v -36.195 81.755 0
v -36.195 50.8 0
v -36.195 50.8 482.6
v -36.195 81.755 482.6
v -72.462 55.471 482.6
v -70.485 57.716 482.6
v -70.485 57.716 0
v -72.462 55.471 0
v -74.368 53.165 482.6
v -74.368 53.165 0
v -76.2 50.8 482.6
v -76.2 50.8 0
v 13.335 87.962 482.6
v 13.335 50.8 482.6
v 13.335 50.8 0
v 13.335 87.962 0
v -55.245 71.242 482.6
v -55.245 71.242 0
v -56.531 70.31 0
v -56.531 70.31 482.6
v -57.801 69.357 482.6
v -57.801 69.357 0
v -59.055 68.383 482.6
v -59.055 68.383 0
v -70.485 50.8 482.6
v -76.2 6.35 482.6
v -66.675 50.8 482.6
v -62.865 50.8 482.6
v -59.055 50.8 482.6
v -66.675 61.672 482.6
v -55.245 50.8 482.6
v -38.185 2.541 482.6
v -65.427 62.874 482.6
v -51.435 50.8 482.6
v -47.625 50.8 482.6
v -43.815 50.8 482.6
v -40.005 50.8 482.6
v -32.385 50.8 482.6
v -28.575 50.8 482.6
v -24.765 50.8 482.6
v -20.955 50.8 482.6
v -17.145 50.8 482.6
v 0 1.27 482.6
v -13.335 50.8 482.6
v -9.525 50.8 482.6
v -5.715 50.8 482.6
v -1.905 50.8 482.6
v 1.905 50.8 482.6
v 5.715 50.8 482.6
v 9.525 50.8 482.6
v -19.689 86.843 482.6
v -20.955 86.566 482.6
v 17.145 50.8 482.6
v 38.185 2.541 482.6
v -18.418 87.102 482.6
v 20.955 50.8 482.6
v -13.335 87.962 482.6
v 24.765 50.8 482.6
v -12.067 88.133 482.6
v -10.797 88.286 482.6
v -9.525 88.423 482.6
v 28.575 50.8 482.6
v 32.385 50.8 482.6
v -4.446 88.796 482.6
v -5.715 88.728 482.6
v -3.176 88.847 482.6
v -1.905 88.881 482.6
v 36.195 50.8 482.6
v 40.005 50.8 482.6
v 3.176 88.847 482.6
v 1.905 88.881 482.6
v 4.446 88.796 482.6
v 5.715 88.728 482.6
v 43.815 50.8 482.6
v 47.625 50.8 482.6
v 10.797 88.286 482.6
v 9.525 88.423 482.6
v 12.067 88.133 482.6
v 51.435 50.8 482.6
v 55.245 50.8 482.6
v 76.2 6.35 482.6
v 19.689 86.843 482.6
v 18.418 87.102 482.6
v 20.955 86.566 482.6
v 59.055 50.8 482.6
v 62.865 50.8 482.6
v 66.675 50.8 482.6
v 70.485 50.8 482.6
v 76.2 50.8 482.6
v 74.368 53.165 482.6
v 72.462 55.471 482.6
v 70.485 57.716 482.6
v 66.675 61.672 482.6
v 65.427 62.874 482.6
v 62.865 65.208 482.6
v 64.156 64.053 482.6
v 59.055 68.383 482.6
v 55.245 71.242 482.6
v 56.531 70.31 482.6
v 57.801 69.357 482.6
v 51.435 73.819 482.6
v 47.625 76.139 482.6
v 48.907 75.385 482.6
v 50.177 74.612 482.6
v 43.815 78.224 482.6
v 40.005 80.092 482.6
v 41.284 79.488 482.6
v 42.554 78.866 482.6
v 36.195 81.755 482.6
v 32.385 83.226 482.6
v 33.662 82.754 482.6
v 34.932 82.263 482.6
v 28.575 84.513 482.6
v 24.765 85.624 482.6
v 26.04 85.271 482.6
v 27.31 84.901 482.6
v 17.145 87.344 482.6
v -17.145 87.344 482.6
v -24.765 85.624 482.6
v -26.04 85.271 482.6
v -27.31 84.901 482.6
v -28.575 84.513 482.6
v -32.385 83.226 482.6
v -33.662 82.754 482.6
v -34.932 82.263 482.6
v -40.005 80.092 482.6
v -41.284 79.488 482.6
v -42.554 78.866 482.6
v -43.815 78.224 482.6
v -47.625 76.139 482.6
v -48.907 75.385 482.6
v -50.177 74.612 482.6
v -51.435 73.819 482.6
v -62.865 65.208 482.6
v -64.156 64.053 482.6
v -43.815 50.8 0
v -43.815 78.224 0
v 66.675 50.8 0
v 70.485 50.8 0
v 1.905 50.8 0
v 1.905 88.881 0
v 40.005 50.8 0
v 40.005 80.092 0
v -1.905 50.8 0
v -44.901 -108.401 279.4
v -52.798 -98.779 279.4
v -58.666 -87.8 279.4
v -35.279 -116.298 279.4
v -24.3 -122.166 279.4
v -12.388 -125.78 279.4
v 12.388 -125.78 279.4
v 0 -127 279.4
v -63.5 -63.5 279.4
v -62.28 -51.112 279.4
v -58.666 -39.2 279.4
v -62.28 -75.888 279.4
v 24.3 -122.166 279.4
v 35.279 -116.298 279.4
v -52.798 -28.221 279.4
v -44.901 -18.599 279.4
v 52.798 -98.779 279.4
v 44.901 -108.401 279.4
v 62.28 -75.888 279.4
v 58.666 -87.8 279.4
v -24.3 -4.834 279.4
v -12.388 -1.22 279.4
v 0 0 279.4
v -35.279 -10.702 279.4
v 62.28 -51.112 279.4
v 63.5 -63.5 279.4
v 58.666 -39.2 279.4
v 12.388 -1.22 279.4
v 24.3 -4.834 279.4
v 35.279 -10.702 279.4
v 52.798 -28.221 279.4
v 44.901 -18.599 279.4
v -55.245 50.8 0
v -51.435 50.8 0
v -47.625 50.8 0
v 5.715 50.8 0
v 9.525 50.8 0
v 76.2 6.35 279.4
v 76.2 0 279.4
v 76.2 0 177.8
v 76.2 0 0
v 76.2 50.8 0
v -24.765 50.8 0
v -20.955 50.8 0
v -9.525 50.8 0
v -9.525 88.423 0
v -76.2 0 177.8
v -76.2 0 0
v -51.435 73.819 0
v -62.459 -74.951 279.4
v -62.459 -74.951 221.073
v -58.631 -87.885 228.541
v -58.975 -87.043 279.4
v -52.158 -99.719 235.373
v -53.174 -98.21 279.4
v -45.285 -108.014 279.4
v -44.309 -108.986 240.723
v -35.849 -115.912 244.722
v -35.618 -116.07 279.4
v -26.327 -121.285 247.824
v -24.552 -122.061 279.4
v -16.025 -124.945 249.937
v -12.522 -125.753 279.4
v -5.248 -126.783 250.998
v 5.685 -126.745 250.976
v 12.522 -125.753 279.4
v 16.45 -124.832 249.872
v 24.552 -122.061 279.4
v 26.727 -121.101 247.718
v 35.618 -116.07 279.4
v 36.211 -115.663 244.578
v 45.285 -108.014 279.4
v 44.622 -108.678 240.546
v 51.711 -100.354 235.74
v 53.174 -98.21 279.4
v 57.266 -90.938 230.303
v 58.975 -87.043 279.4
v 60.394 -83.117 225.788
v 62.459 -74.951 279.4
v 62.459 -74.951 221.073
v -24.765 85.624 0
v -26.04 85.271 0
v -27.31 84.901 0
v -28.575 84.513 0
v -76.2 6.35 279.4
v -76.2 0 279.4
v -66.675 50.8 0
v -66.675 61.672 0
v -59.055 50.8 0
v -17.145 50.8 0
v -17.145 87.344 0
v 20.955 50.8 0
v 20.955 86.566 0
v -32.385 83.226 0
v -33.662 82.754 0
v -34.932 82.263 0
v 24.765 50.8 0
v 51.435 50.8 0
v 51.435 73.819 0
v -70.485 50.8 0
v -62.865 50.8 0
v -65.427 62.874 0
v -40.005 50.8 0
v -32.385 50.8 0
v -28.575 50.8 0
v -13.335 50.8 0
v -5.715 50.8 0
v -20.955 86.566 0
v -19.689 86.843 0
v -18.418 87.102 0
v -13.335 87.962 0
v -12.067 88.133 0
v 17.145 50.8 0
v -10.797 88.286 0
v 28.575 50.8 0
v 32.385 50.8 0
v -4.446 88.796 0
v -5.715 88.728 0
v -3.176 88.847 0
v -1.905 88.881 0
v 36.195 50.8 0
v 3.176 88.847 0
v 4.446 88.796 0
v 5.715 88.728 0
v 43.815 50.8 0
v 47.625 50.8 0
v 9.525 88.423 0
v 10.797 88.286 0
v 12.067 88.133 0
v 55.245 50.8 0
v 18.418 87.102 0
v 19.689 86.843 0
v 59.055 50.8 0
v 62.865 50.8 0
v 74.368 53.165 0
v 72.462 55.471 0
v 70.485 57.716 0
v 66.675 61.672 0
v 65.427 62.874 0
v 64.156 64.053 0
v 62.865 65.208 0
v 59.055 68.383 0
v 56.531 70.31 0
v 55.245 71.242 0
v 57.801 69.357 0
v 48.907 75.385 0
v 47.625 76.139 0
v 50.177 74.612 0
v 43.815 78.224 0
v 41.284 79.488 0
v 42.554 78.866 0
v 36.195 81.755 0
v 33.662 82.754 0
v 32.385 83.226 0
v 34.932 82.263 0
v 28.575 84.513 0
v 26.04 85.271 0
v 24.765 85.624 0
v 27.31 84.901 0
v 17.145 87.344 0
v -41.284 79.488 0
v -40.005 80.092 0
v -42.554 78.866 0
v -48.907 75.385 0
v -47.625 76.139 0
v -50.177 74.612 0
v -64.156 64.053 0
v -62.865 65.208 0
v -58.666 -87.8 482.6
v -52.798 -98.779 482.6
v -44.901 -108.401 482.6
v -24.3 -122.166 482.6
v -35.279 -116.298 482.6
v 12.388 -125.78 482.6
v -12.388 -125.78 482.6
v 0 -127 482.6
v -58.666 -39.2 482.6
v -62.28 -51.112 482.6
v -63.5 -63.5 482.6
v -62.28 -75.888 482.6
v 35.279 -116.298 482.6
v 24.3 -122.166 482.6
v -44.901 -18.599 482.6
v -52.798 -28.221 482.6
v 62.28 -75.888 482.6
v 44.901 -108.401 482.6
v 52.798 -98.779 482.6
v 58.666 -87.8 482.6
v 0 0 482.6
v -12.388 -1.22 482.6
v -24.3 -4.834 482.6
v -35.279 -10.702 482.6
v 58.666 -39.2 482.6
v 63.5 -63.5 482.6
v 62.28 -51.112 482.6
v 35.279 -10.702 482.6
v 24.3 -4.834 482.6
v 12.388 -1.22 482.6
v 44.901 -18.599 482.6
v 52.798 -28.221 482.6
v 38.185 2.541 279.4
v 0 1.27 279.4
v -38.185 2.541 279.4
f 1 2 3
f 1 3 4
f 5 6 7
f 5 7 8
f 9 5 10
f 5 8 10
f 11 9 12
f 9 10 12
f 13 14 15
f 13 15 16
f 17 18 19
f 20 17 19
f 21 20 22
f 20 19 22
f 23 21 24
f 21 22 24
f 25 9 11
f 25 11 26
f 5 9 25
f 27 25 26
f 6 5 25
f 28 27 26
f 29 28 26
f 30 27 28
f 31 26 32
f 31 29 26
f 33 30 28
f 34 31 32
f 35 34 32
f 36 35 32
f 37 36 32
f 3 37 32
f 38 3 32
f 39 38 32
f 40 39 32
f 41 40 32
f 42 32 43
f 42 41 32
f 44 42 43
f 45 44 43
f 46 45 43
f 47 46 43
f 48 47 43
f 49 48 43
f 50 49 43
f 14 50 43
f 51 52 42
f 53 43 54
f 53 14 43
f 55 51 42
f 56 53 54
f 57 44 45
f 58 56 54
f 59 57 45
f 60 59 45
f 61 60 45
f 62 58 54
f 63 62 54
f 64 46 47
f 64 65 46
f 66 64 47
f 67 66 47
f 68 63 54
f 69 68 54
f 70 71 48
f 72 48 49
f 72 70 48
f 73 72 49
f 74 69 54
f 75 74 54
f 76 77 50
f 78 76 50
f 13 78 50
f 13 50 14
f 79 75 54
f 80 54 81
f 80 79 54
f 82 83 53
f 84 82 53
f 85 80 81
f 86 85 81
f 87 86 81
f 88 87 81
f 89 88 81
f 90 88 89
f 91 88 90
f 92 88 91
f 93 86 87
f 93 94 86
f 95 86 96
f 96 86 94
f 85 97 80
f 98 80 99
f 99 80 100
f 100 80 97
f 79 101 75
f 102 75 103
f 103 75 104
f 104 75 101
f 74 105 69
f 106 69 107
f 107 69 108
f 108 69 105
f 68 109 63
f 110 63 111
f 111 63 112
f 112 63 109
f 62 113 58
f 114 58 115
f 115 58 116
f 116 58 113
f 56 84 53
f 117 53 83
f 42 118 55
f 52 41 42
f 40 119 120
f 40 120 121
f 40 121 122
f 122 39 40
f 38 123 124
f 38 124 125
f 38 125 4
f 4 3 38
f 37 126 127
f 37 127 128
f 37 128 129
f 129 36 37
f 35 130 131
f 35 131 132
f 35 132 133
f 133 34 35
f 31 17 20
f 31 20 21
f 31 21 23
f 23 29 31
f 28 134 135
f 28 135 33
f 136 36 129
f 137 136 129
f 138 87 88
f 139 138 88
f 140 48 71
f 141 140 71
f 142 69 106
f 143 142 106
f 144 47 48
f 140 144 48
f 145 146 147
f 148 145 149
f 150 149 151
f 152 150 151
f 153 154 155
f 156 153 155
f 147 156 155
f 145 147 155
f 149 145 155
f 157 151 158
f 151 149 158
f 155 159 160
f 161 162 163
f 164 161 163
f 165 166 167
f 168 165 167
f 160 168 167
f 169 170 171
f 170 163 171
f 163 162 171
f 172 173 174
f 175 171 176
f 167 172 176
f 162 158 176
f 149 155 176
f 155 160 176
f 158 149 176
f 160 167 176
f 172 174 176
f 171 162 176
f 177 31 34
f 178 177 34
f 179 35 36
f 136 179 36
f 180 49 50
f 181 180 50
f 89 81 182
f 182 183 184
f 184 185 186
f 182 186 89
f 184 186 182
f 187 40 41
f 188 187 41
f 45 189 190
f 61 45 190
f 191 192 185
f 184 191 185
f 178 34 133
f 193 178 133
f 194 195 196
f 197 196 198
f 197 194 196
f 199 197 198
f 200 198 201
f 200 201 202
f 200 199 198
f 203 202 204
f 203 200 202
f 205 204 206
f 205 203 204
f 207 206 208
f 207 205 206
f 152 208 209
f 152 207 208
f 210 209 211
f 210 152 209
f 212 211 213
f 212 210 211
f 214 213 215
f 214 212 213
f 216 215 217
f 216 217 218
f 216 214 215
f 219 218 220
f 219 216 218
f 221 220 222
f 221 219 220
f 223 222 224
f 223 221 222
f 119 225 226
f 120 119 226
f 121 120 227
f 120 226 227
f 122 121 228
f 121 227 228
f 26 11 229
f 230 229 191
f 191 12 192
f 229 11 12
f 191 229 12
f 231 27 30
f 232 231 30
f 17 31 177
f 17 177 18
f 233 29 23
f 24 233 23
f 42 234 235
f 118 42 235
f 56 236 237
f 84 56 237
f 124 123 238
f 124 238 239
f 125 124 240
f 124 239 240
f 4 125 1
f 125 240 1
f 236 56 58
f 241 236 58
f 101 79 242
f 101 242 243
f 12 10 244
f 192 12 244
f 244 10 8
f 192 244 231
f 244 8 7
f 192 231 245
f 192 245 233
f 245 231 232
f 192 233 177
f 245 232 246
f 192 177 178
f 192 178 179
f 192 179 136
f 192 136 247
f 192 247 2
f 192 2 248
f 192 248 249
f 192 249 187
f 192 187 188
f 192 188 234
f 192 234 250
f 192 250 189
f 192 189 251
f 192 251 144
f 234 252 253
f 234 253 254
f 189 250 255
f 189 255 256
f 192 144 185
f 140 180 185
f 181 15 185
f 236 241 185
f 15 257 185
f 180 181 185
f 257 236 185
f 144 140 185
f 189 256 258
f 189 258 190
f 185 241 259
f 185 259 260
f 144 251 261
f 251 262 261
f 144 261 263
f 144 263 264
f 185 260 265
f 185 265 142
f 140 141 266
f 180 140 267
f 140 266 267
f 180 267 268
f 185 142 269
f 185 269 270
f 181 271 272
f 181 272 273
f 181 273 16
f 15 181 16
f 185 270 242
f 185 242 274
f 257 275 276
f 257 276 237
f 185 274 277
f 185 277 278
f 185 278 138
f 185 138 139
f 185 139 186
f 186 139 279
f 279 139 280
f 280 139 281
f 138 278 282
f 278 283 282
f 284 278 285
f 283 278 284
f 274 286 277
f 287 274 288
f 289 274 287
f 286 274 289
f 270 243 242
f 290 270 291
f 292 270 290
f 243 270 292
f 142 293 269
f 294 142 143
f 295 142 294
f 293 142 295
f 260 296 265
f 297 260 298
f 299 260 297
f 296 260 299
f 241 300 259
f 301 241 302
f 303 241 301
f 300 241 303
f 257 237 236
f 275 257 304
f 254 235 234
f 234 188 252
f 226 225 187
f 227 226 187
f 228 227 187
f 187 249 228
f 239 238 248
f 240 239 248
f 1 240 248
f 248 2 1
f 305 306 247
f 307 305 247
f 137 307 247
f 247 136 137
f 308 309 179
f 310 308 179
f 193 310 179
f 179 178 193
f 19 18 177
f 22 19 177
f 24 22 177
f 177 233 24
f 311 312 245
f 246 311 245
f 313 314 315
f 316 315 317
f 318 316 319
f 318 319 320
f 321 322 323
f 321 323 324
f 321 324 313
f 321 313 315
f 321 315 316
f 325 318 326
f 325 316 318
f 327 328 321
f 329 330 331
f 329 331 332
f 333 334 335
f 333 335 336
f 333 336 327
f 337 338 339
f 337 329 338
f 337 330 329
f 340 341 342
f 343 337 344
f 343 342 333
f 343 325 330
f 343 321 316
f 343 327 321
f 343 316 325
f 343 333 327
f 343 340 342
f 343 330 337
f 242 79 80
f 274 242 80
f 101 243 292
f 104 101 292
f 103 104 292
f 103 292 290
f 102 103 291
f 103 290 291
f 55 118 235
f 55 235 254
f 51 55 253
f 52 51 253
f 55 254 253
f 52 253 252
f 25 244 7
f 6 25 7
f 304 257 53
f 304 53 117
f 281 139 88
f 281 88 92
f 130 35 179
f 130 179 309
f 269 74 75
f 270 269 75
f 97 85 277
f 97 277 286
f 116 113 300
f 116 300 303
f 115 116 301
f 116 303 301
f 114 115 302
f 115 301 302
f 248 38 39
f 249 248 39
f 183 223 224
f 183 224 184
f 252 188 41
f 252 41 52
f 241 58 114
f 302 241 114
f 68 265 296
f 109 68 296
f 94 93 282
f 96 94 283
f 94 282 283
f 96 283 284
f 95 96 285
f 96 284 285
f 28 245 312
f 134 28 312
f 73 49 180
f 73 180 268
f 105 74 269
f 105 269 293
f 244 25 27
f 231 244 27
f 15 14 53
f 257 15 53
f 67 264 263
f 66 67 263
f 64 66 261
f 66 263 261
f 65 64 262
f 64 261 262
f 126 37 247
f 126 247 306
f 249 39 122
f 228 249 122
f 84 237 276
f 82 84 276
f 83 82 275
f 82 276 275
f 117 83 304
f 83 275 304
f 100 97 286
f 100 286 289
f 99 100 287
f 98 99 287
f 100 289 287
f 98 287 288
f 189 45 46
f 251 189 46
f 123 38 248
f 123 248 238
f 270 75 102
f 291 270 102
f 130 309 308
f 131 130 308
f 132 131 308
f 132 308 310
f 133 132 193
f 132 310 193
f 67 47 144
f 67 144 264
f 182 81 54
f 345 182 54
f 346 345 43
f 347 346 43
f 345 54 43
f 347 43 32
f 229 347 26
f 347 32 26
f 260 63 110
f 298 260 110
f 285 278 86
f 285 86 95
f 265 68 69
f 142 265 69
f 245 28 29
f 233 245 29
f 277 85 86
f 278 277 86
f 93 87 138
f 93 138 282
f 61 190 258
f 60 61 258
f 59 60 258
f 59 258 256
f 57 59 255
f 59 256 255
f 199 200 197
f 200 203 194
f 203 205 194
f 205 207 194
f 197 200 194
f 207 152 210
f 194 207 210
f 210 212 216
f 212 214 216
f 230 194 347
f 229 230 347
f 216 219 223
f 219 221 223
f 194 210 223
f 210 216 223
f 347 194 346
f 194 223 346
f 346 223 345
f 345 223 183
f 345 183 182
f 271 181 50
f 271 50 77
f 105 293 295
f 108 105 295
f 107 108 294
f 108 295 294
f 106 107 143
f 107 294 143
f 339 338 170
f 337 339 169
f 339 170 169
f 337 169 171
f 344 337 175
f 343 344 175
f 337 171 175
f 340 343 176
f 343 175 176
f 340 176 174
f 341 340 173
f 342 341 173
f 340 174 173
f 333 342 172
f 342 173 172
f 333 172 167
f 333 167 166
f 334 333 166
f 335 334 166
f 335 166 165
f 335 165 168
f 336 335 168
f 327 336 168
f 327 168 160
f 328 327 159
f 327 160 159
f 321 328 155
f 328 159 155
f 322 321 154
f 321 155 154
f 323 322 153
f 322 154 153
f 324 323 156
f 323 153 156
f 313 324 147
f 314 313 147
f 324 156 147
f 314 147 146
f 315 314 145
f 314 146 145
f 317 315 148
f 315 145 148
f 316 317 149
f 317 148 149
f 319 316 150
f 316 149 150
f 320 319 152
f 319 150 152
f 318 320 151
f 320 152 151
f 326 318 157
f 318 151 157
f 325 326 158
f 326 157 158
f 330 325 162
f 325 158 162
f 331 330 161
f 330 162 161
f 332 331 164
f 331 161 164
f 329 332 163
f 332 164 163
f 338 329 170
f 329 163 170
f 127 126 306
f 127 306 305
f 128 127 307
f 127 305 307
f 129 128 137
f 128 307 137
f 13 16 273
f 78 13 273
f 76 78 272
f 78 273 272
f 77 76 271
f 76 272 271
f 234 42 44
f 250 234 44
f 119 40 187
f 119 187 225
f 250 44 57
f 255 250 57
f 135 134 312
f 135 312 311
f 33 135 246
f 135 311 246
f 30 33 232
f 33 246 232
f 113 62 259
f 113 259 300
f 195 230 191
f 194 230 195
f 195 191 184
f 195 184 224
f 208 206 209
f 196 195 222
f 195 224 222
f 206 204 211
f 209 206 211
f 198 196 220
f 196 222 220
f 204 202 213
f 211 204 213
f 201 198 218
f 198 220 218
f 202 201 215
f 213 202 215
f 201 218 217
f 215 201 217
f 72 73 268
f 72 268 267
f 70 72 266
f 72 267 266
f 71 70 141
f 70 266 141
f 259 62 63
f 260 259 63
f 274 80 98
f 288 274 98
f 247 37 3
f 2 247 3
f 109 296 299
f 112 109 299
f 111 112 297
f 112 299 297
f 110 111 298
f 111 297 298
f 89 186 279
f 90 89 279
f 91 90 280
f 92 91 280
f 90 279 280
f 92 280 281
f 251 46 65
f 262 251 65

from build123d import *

# Parameters (mm, degrees)
F1_DEPTH  = 482.6
F2_W      = 3.81
F2_H      = 38.1
F3_DEPTH  = 482.6
F5_DEPTH  = 304.8
F6_W      = 138.08032
F6_H      = 203.2
F7_DEPTH  = 254
F8_R      = 63.5
F9_DEPTH  = 203.2
F11_DEPTH = 203.2


with BuildPart() as f1:
    # F0 (on Top) → F1 (new body)
    with BuildSketch(Plane.XY):
        with BuildLine():
            ThreePointArc((76.2, 50.8), (0, 88.9), (-76.2, 50.8))
            Line((-76.2, 50.8), (-76.2, 0))
            Line((-76.2, 0), (76.2, 0))
            Line((76.2, 0), (76.2, 50.8))
        make_face()
    extrude(amount=F1_DEPTH)

    # F2 (on face) → F3 (cut)
    with BuildSketch(Plane.XY.offset(482.6)):
        with Locations((0, 69.85)):
            Rectangle(F2_W, F2_H)
        with Locations((7.62, 69.85)):
            Rectangle(F2_W, F2_H)
        with Locations((15.24, 69.85)):
            Rectangle(F2_W, F2_H)
        with Locations((22.86, 69.85)):
            Rectangle(F2_W, F2_H)
        with Locations((30.48, 69.85)):
            Rectangle(F2_W, F2_H)
        with Locations((38.1, 69.85)):
            Rectangle(F2_W, F2_H)
        with Locations((45.72, 69.85)):
            Rectangle(F2_W, F2_H)
        with Locations((53.34, 69.85)):
            Rectangle(F2_W, F2_H)
        with Locations((60.96, 69.85)):
            Rectangle(F2_W, F2_H)
        with Locations((68.58, 69.85)):
            Rectangle(F2_W, F2_H)
        with Locations((-7.62, 69.85)):
            Rectangle(F2_W, F2_H)
        with Locations((-15.24, 69.85)):
            Rectangle(F2_W, F2_H)
        with Locations((-22.86, 69.85)):
            Rectangle(F2_W, F2_H)
        with Locations((-30.48, 69.85)):
            Rectangle(F2_W, F2_H)
        with Locations((-38.1, 69.85)):
            Rectangle(F2_W, F2_H)
        with Locations((-45.72, 69.85)):
            Rectangle(F2_W, F2_H)
        with Locations((-53.34, 69.85)):
            Rectangle(F2_W, F2_H)
        with Locations((-60.96, 69.85)):
            Rectangle(F2_W, F2_H)
        with Locations((-68.58, 69.85)):
            Rectangle(F2_W, F2_H)
    extrude(amount=-F3_DEPTH, mode=Mode.SUBTRACT)

    # F4 (on face) → F5 (join)
    with BuildSketch(Plane.XY.offset(482.6)):
        with BuildLine():
            ThreePointArc((0, 0), (-48.782051, -22.848291), (-62.459016, -74.95082))
            ThreePointArc((-62.459016, -74.95082), (0, -127), (62.459016, -74.95082))
            ThreePointArc((62.459016, -74.95082), (63.239219, -69.24902), (63.5, -63.5))
            ThreePointArc((63.5, -63.5), (44.901281, -18.598719), (0, 0))
        make_face()
        with BuildLine():
            Line((-76.2, 0), (-62.459016, -74.95082))
            ThreePointArc((-62.459016, -74.95082), (-48.782051, -22.848291), (0, 0))
            Line((0, 0), (-76.2, 0))
        make_face()
        with BuildLine():
            ThreePointArc((63.5, -63.5), (63.239219, -69.24902), (62.459016, -74.95082))
            Line((62.459016, -74.95082), (76.2, 0))
            Line((76.2, 0), (0, 0))
            ThreePointArc((0, 0), (44.901281, -18.598719), (63.5, -63.5))
        make_face()
    extrude(amount=-F5_DEPTH)

    # F6 (on face) → F7 (cut)
    with BuildSketch(Plane.YZ.offset(76.2)):
        Polygon((-138.08032, 177.8), (0, 177.8), (-138.08032, 257.52071), align=None)
        with Locations((-69.04016, 381)):
            Rectangle(F6_W, F6_H)
    extrude(amount=-F7_DEPTH, mode=Mode.SUBTRACT)

    # F10 (on face) → F11 (cut, through all)
    with BuildSketch(Plane.XY.offset(482.6)):
        with BuildLine():
            ThreePointArc((76.2, 6.35), (0, 1.27), (-76.2, 6.35))
            Line((-76.2, 6.35), (-76.2, 0))
            Line((-76.2, 0), (76.2, 0))
            Line((76.2, 0), (76.2, 6.35))
        make_face()
    extrude(amount=-F11_DEPTH, mode=Mode.SUBTRACT)


with BuildPart() as f9:
    # F8 (on face) → F9 (new body, through all)
    with BuildSketch(Plane.XY.offset(279.4)):
        with Locations((0, -63.5)):
            Circle(F8_R)
    extrude(amount=F9_DEPTH)


solid = Compound([f1.part, f9.part])
